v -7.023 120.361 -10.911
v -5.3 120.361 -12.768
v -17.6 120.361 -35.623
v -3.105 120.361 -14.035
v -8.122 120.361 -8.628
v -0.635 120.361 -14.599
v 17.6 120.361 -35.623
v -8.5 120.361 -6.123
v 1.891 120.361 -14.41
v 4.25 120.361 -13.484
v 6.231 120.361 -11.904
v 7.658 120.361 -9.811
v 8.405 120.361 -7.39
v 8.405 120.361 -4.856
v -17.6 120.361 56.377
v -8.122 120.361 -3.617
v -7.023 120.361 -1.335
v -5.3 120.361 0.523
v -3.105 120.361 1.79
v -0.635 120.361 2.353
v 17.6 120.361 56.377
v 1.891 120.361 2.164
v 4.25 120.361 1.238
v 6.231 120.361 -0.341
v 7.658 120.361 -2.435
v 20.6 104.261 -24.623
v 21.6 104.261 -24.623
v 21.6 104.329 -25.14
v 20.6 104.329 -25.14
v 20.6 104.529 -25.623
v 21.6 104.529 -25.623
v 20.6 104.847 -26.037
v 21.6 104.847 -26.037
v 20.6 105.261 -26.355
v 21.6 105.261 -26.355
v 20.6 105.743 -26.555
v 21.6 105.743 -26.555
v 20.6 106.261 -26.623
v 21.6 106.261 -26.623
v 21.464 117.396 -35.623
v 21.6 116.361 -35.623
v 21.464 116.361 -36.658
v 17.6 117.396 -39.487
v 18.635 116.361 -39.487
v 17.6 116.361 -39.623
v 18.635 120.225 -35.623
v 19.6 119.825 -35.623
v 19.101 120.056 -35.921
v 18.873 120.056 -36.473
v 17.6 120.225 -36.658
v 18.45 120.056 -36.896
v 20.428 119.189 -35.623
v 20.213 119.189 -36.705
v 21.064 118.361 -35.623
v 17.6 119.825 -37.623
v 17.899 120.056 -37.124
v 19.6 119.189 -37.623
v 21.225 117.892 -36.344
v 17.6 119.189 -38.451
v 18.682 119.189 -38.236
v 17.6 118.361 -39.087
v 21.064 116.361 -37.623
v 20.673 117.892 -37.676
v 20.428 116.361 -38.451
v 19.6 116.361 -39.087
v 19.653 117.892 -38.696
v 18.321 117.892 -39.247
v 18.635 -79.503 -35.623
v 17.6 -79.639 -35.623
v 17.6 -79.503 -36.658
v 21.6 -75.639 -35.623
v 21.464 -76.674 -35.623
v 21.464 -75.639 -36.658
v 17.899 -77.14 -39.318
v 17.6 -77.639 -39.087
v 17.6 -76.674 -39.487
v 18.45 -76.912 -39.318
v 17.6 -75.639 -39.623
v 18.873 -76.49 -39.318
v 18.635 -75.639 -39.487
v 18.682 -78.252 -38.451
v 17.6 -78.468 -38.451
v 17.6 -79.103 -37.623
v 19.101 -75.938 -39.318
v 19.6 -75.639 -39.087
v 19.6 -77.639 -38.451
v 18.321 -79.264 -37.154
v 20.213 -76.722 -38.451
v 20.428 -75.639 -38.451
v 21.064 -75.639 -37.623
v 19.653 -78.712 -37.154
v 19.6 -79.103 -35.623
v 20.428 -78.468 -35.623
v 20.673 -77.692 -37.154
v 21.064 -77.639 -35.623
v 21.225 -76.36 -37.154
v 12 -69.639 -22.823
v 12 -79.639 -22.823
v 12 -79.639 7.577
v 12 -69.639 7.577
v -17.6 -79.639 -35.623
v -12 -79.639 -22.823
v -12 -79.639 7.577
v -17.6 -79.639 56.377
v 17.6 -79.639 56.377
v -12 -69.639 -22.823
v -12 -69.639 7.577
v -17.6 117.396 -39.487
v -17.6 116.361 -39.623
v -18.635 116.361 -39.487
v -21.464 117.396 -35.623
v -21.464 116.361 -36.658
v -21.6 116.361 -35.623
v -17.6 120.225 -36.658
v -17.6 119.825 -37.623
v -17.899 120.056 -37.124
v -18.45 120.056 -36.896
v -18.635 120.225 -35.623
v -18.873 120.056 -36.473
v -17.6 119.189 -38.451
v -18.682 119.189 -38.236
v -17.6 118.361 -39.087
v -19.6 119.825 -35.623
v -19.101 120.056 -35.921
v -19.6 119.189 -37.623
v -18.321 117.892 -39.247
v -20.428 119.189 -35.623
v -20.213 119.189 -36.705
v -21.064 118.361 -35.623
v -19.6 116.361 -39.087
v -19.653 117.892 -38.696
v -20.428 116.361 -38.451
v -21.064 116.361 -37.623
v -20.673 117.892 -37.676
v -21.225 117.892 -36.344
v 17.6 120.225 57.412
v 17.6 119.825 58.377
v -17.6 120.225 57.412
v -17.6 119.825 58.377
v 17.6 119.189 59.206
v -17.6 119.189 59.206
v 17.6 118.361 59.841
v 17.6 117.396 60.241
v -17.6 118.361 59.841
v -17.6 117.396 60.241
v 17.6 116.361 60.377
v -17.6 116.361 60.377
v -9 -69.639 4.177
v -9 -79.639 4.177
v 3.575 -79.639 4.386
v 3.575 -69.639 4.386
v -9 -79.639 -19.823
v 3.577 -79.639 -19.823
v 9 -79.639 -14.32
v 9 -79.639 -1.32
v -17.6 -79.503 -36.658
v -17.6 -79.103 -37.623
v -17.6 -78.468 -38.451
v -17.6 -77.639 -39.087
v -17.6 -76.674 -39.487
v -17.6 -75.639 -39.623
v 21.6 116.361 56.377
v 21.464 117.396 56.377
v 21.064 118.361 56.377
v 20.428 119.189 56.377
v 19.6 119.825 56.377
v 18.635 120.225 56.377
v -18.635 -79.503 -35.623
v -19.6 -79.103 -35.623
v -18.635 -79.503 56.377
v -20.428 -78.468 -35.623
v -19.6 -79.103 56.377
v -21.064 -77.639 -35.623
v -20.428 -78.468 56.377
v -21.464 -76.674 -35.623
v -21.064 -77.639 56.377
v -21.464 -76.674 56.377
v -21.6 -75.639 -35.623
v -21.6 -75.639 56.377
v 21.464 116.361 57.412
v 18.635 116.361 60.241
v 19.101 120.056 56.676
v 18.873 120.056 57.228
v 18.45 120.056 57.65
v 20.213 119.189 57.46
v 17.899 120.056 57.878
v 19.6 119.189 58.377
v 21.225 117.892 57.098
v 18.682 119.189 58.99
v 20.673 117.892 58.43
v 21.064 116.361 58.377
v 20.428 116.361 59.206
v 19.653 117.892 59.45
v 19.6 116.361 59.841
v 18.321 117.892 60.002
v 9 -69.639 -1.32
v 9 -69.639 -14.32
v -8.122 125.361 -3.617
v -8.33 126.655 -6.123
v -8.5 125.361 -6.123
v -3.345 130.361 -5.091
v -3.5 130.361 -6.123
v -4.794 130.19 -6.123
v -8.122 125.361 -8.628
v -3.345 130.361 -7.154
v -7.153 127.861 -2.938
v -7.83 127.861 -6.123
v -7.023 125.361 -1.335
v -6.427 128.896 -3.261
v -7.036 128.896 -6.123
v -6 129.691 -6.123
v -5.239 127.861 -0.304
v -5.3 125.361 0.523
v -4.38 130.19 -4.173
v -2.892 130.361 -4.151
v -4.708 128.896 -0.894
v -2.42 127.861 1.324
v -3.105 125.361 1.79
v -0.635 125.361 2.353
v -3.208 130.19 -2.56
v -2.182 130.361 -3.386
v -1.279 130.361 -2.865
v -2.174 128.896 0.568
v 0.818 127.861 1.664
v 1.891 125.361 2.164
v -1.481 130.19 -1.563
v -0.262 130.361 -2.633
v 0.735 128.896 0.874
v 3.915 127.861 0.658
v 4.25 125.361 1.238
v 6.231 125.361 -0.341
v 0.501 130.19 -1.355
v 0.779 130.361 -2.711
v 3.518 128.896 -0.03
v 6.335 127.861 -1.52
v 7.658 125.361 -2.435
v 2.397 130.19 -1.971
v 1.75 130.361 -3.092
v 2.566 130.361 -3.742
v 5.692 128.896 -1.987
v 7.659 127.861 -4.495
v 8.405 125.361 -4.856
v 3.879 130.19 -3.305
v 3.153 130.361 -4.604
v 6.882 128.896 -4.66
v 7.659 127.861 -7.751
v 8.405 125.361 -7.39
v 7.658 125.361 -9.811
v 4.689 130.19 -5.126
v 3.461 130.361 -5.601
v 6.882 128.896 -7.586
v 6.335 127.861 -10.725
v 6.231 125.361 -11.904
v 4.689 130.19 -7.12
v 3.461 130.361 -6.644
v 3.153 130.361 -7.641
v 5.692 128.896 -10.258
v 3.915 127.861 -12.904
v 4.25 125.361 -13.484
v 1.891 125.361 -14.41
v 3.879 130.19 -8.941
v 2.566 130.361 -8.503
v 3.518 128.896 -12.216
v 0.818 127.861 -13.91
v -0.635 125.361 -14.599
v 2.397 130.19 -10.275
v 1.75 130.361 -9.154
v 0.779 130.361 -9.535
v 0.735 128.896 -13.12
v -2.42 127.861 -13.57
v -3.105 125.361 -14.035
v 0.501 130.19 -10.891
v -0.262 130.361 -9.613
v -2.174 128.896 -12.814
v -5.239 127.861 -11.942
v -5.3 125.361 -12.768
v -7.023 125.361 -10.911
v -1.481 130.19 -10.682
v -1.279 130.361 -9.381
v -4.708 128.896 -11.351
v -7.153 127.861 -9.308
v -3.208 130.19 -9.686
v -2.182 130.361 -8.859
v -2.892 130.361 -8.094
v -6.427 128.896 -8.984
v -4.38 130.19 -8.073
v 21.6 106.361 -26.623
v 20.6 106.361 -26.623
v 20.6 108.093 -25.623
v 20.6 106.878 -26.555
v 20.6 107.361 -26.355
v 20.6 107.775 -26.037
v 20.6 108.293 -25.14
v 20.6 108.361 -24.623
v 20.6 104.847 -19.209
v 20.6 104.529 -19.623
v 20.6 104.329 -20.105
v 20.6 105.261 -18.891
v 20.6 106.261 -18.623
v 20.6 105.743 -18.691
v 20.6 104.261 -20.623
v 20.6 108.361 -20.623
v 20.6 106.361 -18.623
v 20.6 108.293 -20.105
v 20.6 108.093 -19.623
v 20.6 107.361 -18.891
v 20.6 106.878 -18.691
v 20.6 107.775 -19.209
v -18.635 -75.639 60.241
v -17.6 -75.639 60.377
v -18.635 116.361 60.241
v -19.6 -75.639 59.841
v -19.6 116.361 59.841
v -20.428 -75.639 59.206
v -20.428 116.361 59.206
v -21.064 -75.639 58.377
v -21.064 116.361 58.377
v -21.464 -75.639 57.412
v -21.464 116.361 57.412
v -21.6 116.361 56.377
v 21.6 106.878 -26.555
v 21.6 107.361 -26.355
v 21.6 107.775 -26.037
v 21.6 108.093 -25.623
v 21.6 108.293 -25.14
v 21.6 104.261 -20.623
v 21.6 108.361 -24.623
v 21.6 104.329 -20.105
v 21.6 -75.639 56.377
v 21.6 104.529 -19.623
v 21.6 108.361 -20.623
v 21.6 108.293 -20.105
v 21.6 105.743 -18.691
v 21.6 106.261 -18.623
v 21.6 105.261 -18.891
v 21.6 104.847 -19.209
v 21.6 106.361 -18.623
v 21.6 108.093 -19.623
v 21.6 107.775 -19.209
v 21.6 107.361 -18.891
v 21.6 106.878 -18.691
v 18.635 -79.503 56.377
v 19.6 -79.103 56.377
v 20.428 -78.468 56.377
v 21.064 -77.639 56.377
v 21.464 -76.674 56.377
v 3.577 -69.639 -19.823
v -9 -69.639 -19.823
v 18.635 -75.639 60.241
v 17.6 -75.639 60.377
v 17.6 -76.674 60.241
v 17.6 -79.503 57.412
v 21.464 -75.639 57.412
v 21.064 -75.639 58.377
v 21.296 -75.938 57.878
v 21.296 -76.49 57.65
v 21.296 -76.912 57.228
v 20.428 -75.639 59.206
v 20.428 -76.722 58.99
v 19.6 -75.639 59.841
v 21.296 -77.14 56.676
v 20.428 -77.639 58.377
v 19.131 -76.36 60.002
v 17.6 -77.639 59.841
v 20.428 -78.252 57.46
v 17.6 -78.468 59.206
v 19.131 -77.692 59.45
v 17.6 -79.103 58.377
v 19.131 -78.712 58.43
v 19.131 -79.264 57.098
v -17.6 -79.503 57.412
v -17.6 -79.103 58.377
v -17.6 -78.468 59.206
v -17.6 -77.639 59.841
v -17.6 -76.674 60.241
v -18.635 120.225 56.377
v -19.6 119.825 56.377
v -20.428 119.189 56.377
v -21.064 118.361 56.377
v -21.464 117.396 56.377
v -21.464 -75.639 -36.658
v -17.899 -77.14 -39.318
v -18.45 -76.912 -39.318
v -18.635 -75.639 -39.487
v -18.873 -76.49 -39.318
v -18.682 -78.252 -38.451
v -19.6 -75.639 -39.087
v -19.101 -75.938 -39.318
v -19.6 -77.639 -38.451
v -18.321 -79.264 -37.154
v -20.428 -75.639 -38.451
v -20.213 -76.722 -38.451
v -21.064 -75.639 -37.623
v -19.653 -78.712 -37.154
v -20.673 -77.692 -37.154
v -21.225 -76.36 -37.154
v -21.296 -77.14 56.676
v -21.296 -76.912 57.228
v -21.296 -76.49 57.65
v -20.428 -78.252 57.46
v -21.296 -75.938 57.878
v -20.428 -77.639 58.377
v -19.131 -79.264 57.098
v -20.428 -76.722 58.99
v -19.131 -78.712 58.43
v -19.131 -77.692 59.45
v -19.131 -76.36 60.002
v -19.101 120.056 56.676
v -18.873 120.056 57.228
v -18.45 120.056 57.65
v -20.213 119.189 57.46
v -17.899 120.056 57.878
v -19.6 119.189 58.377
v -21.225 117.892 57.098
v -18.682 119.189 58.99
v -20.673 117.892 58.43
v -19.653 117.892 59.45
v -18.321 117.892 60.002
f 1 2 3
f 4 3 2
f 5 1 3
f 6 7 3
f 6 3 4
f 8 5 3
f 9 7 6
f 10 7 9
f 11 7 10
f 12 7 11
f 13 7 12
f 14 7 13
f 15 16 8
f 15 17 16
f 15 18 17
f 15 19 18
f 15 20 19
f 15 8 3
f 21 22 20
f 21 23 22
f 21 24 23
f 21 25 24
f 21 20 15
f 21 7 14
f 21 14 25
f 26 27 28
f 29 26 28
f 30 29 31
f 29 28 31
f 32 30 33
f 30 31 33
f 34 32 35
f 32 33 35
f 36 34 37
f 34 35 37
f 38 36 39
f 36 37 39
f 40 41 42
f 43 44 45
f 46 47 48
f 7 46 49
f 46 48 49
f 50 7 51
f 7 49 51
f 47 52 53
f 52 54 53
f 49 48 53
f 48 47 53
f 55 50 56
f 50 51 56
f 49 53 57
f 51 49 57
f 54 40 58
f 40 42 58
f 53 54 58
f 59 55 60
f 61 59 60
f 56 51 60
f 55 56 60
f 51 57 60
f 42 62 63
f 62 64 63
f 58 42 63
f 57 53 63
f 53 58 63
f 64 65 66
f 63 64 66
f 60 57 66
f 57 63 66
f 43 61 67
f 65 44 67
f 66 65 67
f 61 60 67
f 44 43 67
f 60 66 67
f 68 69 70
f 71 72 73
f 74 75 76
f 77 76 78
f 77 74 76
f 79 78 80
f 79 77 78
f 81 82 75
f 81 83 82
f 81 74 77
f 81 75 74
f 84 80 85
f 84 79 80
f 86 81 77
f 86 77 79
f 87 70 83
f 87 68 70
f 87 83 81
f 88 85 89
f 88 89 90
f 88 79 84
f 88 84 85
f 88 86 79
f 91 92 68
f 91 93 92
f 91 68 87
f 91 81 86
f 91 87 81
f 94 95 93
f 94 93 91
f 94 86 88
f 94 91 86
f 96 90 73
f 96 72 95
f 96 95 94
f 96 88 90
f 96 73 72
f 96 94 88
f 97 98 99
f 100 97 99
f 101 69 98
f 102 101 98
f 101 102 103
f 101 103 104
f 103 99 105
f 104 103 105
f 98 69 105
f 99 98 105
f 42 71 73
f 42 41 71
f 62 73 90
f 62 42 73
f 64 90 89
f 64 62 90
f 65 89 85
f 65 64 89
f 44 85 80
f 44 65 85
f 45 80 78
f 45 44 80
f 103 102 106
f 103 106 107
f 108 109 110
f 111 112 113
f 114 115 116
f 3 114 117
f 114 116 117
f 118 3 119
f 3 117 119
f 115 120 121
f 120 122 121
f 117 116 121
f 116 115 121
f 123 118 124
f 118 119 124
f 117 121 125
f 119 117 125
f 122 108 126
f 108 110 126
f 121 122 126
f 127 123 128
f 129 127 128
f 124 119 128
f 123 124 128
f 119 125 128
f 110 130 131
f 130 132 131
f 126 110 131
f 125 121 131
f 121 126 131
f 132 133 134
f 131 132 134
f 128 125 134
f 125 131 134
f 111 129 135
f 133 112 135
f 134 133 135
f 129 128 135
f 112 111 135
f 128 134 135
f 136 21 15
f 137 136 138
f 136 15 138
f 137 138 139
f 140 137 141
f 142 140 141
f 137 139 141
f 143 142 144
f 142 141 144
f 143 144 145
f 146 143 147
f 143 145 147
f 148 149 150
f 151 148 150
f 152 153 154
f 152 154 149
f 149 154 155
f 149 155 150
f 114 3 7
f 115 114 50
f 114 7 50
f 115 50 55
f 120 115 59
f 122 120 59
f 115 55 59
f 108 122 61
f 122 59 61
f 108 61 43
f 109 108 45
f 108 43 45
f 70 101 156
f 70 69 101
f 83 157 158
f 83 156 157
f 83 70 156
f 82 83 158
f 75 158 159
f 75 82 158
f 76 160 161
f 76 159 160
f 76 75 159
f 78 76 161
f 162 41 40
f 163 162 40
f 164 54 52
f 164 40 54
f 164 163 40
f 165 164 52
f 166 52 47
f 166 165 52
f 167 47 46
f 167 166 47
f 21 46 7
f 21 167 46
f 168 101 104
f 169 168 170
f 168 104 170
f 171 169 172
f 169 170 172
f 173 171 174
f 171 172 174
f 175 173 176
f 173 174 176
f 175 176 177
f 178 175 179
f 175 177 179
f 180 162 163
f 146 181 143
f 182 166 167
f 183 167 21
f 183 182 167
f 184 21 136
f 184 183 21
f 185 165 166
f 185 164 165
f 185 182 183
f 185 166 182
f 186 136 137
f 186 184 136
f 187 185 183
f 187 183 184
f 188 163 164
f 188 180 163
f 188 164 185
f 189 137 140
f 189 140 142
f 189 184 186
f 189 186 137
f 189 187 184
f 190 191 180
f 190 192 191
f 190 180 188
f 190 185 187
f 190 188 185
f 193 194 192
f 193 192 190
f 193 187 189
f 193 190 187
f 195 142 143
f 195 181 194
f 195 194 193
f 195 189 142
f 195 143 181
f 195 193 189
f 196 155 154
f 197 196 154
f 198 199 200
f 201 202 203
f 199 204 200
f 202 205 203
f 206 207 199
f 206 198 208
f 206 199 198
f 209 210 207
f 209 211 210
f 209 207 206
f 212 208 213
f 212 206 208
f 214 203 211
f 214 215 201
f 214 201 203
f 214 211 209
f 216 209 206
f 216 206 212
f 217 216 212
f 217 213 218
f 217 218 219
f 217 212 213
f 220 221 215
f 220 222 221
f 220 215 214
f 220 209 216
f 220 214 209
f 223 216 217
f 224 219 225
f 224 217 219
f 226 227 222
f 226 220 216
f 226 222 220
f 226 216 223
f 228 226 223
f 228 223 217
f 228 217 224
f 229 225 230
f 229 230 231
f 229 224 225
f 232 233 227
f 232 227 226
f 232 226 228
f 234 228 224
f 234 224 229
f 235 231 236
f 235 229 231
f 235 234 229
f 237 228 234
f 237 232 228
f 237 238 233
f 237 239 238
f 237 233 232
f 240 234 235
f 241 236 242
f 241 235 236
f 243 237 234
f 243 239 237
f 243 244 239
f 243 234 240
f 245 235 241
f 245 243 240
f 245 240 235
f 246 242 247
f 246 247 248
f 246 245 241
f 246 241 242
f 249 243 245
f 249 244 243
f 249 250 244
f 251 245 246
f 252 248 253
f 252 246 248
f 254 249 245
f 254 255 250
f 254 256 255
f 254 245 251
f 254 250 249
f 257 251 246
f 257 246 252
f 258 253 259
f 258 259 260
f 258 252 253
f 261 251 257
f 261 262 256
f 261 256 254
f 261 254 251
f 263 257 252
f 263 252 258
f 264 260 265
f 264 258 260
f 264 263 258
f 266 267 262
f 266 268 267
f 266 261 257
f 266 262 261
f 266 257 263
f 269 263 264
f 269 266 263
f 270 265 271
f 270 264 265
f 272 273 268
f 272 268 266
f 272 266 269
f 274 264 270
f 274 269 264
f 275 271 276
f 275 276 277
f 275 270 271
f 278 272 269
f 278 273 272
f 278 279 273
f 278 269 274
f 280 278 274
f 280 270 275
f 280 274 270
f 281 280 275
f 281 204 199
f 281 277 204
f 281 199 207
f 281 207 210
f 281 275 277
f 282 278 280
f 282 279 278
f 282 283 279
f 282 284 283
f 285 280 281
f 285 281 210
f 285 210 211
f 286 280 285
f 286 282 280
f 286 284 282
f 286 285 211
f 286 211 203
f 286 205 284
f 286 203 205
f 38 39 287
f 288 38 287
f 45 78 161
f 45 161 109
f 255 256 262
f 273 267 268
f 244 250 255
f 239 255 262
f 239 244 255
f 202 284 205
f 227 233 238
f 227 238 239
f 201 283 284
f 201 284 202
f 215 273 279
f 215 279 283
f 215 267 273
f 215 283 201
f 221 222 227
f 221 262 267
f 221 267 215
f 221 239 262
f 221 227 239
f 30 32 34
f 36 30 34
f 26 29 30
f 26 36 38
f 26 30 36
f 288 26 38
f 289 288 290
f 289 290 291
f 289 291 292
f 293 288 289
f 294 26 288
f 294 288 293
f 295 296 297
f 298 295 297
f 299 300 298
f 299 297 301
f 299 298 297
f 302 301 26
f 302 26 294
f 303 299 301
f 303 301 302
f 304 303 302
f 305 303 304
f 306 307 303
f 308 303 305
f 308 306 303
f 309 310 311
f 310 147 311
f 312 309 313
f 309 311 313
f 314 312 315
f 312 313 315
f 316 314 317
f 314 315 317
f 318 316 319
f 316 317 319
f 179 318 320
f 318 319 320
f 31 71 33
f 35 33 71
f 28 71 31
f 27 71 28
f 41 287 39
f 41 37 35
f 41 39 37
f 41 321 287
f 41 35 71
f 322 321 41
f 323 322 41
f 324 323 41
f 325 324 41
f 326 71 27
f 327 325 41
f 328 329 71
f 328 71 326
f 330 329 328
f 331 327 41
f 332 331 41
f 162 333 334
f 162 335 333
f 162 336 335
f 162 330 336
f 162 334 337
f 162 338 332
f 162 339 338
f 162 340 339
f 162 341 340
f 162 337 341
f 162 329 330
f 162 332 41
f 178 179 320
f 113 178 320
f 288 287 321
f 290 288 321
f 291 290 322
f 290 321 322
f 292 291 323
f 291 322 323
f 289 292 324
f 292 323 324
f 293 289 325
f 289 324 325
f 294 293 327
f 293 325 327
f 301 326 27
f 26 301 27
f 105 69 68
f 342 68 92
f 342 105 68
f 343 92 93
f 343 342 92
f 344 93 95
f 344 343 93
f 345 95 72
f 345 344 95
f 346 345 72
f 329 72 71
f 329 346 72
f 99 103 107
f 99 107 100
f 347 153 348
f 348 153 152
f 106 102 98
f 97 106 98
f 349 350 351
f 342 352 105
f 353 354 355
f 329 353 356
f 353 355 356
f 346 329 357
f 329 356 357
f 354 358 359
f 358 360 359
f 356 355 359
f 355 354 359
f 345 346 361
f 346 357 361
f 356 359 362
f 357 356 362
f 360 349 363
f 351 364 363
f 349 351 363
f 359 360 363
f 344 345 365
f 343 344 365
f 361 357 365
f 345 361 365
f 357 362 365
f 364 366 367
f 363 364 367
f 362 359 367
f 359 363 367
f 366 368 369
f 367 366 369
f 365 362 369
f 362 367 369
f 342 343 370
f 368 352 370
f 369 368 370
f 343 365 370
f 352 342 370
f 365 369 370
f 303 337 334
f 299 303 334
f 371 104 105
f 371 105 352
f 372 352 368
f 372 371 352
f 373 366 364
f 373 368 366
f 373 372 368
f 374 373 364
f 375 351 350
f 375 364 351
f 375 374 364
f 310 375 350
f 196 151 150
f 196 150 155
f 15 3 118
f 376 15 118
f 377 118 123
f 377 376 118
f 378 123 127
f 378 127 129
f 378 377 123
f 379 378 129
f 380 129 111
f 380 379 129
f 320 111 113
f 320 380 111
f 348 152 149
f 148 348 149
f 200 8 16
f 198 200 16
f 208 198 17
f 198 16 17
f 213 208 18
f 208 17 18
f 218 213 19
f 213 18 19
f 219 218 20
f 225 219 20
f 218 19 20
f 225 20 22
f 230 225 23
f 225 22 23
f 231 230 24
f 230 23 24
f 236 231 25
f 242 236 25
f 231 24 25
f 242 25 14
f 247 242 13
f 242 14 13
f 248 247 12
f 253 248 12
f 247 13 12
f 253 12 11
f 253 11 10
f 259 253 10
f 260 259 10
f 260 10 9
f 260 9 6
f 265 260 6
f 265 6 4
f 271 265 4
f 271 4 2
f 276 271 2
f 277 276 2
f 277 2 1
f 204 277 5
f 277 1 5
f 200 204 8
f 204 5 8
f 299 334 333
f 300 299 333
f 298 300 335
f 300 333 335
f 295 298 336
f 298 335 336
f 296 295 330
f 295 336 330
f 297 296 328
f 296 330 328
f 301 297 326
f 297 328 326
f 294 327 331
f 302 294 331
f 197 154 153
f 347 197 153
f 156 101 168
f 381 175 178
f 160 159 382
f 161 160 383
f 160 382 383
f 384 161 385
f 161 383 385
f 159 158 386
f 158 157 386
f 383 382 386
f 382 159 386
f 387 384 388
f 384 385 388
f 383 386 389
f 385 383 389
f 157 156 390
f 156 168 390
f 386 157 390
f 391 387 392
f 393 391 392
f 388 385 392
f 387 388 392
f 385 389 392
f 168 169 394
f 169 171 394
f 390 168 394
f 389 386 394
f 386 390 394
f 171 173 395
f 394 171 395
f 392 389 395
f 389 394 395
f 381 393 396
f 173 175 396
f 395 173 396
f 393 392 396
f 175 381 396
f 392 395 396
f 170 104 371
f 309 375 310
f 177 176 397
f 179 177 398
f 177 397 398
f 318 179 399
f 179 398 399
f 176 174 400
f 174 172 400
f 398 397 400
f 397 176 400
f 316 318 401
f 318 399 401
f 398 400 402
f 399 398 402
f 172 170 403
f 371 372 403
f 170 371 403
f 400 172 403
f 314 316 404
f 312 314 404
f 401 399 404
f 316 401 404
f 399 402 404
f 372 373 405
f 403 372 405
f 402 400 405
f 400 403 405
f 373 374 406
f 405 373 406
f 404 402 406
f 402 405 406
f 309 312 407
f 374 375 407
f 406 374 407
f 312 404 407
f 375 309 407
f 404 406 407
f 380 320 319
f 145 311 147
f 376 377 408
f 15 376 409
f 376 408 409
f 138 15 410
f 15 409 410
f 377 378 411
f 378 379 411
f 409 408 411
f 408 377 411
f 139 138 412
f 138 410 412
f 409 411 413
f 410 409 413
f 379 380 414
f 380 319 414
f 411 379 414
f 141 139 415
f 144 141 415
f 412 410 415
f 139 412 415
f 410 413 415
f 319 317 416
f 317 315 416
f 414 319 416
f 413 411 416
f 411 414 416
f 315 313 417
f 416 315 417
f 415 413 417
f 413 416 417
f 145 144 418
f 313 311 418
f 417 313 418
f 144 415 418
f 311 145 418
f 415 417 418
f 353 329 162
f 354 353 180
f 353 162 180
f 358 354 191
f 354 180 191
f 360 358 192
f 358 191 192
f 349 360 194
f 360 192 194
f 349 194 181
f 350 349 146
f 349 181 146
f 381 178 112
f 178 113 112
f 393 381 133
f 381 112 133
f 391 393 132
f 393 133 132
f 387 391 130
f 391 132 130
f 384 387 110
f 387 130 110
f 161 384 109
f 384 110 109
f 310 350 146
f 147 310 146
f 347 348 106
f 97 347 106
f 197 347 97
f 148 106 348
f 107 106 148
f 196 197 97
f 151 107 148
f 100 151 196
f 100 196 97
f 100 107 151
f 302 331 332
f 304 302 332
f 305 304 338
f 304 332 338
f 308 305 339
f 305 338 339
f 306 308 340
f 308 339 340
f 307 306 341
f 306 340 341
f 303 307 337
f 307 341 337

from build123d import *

# Parameters (mm, degrees)
F0_W     = 200
F0_H     = 100
F1_DEPTH = 21.6
F2_R     = 4
F4_DEPTH = 1
F5_R     = 8.5
F6_DEPTH = 10
F7_R     = 5
F8_W     = 24
F8_H     = 30.4
F9_DEPTH = 10


with BuildPart() as f1:
    # F0 (on Right) → F1 (new body, symmetric)
    with BuildSketch(Plane.YZ):
        with Locations((20.360822, 10.377156)):
            Rectangle(F0_W, F0_H)
    extrude(amount=F1_DEPTH, both=True)

    # F2
    f2_edges = [f1.edges().sort_by_distance(p)[0] for p in [
        (0, -79.639178, 60.377156),
        (-21.6, -79.639178, 10.377156),
        (-21.6, 20.360822, 60.377156),
        (21.6, 20.360822, 60.377156),
        (21.6, -79.639178, 10.377156),
        (0, -79.639178, -39.622844),
        (-21.6, 20.360822, -39.622844),
        (21.6, 20.360822, -39.622844),
        (21.6, 120.360822, 10.377156),
        (0, 120.360822, -39.622844),
        (-21.6, 120.360822, 10.377156),
        (0, 120.360822, 60.377156),
    ]]
    fillet(f2_edges, radius=F2_R)

    # F3 (on face) → F4 (cut)
    with BuildSketch(Plane.YZ.offset(21.6)):
        with BuildLine():
            Line((106.260822, -26.622844), (106.360822, -26.622844))
            ThreePointArc((106.360822, -26.622844), (107.775035, -26.037058), (108.360822, -24.622844))
            Line((108.360822, -24.622844), (108.360822, -20.622844))
            ThreePointArc((108.360822, -20.622844), (107.775035, -19.208631), (106.360822, -18.622844))
            Line((106.360822, -18.622844), (106.260822, -18.622844))
            ThreePointArc((106.260822, -18.622844), (104.846608, -19.208631), (104.260822, -20.622844))
            Line((104.260822, -20.622844), (104.260822, -24.622844))
            ThreePointArc((104.260822, -24.622844), (104.846608, -26.037058), (106.260822, -26.622844))
        make_face()
    extrude(amount=-F4_DEPTH, mode=Mode.SUBTRACT)

    # F5 (on face) → F6 (join)
    with BuildSketch(Plane(origin=(0, 120.360822, 0), x_dir=(-1, 0, 0), z_dir=(0, 1, 0))):
        with Locations((0, -6.122844)):
            Circle(F5_R)
    extrude(amount=F6_DEPTH)

    # F7
    f7_edges = [f1.edges().sort_by_distance(p)[0] for p in [
        (8.5, 130.360822, -6.122844),
    ]]
    fillet(f7_edges, radius=F7_R)

    # F8 (on face) → F9 (cut)
    with BuildSketch(Plane.XZ.offset(79.639178)):
        with Locations((0, -7.622844)):
            Rectangle(F8_W, F8_H)
        Polygon((-9, -19.822844), (-9, 4.177156), (3.575129, 4.386477), (9, -1.319719), (9, -14.319719), (3.576871, -19.822844), align=None, mode=Mode.SUBTRACT)
    extrude(amount=-F9_DEPTH, mode=Mode.SUBTRACT)


solid = f1.part
